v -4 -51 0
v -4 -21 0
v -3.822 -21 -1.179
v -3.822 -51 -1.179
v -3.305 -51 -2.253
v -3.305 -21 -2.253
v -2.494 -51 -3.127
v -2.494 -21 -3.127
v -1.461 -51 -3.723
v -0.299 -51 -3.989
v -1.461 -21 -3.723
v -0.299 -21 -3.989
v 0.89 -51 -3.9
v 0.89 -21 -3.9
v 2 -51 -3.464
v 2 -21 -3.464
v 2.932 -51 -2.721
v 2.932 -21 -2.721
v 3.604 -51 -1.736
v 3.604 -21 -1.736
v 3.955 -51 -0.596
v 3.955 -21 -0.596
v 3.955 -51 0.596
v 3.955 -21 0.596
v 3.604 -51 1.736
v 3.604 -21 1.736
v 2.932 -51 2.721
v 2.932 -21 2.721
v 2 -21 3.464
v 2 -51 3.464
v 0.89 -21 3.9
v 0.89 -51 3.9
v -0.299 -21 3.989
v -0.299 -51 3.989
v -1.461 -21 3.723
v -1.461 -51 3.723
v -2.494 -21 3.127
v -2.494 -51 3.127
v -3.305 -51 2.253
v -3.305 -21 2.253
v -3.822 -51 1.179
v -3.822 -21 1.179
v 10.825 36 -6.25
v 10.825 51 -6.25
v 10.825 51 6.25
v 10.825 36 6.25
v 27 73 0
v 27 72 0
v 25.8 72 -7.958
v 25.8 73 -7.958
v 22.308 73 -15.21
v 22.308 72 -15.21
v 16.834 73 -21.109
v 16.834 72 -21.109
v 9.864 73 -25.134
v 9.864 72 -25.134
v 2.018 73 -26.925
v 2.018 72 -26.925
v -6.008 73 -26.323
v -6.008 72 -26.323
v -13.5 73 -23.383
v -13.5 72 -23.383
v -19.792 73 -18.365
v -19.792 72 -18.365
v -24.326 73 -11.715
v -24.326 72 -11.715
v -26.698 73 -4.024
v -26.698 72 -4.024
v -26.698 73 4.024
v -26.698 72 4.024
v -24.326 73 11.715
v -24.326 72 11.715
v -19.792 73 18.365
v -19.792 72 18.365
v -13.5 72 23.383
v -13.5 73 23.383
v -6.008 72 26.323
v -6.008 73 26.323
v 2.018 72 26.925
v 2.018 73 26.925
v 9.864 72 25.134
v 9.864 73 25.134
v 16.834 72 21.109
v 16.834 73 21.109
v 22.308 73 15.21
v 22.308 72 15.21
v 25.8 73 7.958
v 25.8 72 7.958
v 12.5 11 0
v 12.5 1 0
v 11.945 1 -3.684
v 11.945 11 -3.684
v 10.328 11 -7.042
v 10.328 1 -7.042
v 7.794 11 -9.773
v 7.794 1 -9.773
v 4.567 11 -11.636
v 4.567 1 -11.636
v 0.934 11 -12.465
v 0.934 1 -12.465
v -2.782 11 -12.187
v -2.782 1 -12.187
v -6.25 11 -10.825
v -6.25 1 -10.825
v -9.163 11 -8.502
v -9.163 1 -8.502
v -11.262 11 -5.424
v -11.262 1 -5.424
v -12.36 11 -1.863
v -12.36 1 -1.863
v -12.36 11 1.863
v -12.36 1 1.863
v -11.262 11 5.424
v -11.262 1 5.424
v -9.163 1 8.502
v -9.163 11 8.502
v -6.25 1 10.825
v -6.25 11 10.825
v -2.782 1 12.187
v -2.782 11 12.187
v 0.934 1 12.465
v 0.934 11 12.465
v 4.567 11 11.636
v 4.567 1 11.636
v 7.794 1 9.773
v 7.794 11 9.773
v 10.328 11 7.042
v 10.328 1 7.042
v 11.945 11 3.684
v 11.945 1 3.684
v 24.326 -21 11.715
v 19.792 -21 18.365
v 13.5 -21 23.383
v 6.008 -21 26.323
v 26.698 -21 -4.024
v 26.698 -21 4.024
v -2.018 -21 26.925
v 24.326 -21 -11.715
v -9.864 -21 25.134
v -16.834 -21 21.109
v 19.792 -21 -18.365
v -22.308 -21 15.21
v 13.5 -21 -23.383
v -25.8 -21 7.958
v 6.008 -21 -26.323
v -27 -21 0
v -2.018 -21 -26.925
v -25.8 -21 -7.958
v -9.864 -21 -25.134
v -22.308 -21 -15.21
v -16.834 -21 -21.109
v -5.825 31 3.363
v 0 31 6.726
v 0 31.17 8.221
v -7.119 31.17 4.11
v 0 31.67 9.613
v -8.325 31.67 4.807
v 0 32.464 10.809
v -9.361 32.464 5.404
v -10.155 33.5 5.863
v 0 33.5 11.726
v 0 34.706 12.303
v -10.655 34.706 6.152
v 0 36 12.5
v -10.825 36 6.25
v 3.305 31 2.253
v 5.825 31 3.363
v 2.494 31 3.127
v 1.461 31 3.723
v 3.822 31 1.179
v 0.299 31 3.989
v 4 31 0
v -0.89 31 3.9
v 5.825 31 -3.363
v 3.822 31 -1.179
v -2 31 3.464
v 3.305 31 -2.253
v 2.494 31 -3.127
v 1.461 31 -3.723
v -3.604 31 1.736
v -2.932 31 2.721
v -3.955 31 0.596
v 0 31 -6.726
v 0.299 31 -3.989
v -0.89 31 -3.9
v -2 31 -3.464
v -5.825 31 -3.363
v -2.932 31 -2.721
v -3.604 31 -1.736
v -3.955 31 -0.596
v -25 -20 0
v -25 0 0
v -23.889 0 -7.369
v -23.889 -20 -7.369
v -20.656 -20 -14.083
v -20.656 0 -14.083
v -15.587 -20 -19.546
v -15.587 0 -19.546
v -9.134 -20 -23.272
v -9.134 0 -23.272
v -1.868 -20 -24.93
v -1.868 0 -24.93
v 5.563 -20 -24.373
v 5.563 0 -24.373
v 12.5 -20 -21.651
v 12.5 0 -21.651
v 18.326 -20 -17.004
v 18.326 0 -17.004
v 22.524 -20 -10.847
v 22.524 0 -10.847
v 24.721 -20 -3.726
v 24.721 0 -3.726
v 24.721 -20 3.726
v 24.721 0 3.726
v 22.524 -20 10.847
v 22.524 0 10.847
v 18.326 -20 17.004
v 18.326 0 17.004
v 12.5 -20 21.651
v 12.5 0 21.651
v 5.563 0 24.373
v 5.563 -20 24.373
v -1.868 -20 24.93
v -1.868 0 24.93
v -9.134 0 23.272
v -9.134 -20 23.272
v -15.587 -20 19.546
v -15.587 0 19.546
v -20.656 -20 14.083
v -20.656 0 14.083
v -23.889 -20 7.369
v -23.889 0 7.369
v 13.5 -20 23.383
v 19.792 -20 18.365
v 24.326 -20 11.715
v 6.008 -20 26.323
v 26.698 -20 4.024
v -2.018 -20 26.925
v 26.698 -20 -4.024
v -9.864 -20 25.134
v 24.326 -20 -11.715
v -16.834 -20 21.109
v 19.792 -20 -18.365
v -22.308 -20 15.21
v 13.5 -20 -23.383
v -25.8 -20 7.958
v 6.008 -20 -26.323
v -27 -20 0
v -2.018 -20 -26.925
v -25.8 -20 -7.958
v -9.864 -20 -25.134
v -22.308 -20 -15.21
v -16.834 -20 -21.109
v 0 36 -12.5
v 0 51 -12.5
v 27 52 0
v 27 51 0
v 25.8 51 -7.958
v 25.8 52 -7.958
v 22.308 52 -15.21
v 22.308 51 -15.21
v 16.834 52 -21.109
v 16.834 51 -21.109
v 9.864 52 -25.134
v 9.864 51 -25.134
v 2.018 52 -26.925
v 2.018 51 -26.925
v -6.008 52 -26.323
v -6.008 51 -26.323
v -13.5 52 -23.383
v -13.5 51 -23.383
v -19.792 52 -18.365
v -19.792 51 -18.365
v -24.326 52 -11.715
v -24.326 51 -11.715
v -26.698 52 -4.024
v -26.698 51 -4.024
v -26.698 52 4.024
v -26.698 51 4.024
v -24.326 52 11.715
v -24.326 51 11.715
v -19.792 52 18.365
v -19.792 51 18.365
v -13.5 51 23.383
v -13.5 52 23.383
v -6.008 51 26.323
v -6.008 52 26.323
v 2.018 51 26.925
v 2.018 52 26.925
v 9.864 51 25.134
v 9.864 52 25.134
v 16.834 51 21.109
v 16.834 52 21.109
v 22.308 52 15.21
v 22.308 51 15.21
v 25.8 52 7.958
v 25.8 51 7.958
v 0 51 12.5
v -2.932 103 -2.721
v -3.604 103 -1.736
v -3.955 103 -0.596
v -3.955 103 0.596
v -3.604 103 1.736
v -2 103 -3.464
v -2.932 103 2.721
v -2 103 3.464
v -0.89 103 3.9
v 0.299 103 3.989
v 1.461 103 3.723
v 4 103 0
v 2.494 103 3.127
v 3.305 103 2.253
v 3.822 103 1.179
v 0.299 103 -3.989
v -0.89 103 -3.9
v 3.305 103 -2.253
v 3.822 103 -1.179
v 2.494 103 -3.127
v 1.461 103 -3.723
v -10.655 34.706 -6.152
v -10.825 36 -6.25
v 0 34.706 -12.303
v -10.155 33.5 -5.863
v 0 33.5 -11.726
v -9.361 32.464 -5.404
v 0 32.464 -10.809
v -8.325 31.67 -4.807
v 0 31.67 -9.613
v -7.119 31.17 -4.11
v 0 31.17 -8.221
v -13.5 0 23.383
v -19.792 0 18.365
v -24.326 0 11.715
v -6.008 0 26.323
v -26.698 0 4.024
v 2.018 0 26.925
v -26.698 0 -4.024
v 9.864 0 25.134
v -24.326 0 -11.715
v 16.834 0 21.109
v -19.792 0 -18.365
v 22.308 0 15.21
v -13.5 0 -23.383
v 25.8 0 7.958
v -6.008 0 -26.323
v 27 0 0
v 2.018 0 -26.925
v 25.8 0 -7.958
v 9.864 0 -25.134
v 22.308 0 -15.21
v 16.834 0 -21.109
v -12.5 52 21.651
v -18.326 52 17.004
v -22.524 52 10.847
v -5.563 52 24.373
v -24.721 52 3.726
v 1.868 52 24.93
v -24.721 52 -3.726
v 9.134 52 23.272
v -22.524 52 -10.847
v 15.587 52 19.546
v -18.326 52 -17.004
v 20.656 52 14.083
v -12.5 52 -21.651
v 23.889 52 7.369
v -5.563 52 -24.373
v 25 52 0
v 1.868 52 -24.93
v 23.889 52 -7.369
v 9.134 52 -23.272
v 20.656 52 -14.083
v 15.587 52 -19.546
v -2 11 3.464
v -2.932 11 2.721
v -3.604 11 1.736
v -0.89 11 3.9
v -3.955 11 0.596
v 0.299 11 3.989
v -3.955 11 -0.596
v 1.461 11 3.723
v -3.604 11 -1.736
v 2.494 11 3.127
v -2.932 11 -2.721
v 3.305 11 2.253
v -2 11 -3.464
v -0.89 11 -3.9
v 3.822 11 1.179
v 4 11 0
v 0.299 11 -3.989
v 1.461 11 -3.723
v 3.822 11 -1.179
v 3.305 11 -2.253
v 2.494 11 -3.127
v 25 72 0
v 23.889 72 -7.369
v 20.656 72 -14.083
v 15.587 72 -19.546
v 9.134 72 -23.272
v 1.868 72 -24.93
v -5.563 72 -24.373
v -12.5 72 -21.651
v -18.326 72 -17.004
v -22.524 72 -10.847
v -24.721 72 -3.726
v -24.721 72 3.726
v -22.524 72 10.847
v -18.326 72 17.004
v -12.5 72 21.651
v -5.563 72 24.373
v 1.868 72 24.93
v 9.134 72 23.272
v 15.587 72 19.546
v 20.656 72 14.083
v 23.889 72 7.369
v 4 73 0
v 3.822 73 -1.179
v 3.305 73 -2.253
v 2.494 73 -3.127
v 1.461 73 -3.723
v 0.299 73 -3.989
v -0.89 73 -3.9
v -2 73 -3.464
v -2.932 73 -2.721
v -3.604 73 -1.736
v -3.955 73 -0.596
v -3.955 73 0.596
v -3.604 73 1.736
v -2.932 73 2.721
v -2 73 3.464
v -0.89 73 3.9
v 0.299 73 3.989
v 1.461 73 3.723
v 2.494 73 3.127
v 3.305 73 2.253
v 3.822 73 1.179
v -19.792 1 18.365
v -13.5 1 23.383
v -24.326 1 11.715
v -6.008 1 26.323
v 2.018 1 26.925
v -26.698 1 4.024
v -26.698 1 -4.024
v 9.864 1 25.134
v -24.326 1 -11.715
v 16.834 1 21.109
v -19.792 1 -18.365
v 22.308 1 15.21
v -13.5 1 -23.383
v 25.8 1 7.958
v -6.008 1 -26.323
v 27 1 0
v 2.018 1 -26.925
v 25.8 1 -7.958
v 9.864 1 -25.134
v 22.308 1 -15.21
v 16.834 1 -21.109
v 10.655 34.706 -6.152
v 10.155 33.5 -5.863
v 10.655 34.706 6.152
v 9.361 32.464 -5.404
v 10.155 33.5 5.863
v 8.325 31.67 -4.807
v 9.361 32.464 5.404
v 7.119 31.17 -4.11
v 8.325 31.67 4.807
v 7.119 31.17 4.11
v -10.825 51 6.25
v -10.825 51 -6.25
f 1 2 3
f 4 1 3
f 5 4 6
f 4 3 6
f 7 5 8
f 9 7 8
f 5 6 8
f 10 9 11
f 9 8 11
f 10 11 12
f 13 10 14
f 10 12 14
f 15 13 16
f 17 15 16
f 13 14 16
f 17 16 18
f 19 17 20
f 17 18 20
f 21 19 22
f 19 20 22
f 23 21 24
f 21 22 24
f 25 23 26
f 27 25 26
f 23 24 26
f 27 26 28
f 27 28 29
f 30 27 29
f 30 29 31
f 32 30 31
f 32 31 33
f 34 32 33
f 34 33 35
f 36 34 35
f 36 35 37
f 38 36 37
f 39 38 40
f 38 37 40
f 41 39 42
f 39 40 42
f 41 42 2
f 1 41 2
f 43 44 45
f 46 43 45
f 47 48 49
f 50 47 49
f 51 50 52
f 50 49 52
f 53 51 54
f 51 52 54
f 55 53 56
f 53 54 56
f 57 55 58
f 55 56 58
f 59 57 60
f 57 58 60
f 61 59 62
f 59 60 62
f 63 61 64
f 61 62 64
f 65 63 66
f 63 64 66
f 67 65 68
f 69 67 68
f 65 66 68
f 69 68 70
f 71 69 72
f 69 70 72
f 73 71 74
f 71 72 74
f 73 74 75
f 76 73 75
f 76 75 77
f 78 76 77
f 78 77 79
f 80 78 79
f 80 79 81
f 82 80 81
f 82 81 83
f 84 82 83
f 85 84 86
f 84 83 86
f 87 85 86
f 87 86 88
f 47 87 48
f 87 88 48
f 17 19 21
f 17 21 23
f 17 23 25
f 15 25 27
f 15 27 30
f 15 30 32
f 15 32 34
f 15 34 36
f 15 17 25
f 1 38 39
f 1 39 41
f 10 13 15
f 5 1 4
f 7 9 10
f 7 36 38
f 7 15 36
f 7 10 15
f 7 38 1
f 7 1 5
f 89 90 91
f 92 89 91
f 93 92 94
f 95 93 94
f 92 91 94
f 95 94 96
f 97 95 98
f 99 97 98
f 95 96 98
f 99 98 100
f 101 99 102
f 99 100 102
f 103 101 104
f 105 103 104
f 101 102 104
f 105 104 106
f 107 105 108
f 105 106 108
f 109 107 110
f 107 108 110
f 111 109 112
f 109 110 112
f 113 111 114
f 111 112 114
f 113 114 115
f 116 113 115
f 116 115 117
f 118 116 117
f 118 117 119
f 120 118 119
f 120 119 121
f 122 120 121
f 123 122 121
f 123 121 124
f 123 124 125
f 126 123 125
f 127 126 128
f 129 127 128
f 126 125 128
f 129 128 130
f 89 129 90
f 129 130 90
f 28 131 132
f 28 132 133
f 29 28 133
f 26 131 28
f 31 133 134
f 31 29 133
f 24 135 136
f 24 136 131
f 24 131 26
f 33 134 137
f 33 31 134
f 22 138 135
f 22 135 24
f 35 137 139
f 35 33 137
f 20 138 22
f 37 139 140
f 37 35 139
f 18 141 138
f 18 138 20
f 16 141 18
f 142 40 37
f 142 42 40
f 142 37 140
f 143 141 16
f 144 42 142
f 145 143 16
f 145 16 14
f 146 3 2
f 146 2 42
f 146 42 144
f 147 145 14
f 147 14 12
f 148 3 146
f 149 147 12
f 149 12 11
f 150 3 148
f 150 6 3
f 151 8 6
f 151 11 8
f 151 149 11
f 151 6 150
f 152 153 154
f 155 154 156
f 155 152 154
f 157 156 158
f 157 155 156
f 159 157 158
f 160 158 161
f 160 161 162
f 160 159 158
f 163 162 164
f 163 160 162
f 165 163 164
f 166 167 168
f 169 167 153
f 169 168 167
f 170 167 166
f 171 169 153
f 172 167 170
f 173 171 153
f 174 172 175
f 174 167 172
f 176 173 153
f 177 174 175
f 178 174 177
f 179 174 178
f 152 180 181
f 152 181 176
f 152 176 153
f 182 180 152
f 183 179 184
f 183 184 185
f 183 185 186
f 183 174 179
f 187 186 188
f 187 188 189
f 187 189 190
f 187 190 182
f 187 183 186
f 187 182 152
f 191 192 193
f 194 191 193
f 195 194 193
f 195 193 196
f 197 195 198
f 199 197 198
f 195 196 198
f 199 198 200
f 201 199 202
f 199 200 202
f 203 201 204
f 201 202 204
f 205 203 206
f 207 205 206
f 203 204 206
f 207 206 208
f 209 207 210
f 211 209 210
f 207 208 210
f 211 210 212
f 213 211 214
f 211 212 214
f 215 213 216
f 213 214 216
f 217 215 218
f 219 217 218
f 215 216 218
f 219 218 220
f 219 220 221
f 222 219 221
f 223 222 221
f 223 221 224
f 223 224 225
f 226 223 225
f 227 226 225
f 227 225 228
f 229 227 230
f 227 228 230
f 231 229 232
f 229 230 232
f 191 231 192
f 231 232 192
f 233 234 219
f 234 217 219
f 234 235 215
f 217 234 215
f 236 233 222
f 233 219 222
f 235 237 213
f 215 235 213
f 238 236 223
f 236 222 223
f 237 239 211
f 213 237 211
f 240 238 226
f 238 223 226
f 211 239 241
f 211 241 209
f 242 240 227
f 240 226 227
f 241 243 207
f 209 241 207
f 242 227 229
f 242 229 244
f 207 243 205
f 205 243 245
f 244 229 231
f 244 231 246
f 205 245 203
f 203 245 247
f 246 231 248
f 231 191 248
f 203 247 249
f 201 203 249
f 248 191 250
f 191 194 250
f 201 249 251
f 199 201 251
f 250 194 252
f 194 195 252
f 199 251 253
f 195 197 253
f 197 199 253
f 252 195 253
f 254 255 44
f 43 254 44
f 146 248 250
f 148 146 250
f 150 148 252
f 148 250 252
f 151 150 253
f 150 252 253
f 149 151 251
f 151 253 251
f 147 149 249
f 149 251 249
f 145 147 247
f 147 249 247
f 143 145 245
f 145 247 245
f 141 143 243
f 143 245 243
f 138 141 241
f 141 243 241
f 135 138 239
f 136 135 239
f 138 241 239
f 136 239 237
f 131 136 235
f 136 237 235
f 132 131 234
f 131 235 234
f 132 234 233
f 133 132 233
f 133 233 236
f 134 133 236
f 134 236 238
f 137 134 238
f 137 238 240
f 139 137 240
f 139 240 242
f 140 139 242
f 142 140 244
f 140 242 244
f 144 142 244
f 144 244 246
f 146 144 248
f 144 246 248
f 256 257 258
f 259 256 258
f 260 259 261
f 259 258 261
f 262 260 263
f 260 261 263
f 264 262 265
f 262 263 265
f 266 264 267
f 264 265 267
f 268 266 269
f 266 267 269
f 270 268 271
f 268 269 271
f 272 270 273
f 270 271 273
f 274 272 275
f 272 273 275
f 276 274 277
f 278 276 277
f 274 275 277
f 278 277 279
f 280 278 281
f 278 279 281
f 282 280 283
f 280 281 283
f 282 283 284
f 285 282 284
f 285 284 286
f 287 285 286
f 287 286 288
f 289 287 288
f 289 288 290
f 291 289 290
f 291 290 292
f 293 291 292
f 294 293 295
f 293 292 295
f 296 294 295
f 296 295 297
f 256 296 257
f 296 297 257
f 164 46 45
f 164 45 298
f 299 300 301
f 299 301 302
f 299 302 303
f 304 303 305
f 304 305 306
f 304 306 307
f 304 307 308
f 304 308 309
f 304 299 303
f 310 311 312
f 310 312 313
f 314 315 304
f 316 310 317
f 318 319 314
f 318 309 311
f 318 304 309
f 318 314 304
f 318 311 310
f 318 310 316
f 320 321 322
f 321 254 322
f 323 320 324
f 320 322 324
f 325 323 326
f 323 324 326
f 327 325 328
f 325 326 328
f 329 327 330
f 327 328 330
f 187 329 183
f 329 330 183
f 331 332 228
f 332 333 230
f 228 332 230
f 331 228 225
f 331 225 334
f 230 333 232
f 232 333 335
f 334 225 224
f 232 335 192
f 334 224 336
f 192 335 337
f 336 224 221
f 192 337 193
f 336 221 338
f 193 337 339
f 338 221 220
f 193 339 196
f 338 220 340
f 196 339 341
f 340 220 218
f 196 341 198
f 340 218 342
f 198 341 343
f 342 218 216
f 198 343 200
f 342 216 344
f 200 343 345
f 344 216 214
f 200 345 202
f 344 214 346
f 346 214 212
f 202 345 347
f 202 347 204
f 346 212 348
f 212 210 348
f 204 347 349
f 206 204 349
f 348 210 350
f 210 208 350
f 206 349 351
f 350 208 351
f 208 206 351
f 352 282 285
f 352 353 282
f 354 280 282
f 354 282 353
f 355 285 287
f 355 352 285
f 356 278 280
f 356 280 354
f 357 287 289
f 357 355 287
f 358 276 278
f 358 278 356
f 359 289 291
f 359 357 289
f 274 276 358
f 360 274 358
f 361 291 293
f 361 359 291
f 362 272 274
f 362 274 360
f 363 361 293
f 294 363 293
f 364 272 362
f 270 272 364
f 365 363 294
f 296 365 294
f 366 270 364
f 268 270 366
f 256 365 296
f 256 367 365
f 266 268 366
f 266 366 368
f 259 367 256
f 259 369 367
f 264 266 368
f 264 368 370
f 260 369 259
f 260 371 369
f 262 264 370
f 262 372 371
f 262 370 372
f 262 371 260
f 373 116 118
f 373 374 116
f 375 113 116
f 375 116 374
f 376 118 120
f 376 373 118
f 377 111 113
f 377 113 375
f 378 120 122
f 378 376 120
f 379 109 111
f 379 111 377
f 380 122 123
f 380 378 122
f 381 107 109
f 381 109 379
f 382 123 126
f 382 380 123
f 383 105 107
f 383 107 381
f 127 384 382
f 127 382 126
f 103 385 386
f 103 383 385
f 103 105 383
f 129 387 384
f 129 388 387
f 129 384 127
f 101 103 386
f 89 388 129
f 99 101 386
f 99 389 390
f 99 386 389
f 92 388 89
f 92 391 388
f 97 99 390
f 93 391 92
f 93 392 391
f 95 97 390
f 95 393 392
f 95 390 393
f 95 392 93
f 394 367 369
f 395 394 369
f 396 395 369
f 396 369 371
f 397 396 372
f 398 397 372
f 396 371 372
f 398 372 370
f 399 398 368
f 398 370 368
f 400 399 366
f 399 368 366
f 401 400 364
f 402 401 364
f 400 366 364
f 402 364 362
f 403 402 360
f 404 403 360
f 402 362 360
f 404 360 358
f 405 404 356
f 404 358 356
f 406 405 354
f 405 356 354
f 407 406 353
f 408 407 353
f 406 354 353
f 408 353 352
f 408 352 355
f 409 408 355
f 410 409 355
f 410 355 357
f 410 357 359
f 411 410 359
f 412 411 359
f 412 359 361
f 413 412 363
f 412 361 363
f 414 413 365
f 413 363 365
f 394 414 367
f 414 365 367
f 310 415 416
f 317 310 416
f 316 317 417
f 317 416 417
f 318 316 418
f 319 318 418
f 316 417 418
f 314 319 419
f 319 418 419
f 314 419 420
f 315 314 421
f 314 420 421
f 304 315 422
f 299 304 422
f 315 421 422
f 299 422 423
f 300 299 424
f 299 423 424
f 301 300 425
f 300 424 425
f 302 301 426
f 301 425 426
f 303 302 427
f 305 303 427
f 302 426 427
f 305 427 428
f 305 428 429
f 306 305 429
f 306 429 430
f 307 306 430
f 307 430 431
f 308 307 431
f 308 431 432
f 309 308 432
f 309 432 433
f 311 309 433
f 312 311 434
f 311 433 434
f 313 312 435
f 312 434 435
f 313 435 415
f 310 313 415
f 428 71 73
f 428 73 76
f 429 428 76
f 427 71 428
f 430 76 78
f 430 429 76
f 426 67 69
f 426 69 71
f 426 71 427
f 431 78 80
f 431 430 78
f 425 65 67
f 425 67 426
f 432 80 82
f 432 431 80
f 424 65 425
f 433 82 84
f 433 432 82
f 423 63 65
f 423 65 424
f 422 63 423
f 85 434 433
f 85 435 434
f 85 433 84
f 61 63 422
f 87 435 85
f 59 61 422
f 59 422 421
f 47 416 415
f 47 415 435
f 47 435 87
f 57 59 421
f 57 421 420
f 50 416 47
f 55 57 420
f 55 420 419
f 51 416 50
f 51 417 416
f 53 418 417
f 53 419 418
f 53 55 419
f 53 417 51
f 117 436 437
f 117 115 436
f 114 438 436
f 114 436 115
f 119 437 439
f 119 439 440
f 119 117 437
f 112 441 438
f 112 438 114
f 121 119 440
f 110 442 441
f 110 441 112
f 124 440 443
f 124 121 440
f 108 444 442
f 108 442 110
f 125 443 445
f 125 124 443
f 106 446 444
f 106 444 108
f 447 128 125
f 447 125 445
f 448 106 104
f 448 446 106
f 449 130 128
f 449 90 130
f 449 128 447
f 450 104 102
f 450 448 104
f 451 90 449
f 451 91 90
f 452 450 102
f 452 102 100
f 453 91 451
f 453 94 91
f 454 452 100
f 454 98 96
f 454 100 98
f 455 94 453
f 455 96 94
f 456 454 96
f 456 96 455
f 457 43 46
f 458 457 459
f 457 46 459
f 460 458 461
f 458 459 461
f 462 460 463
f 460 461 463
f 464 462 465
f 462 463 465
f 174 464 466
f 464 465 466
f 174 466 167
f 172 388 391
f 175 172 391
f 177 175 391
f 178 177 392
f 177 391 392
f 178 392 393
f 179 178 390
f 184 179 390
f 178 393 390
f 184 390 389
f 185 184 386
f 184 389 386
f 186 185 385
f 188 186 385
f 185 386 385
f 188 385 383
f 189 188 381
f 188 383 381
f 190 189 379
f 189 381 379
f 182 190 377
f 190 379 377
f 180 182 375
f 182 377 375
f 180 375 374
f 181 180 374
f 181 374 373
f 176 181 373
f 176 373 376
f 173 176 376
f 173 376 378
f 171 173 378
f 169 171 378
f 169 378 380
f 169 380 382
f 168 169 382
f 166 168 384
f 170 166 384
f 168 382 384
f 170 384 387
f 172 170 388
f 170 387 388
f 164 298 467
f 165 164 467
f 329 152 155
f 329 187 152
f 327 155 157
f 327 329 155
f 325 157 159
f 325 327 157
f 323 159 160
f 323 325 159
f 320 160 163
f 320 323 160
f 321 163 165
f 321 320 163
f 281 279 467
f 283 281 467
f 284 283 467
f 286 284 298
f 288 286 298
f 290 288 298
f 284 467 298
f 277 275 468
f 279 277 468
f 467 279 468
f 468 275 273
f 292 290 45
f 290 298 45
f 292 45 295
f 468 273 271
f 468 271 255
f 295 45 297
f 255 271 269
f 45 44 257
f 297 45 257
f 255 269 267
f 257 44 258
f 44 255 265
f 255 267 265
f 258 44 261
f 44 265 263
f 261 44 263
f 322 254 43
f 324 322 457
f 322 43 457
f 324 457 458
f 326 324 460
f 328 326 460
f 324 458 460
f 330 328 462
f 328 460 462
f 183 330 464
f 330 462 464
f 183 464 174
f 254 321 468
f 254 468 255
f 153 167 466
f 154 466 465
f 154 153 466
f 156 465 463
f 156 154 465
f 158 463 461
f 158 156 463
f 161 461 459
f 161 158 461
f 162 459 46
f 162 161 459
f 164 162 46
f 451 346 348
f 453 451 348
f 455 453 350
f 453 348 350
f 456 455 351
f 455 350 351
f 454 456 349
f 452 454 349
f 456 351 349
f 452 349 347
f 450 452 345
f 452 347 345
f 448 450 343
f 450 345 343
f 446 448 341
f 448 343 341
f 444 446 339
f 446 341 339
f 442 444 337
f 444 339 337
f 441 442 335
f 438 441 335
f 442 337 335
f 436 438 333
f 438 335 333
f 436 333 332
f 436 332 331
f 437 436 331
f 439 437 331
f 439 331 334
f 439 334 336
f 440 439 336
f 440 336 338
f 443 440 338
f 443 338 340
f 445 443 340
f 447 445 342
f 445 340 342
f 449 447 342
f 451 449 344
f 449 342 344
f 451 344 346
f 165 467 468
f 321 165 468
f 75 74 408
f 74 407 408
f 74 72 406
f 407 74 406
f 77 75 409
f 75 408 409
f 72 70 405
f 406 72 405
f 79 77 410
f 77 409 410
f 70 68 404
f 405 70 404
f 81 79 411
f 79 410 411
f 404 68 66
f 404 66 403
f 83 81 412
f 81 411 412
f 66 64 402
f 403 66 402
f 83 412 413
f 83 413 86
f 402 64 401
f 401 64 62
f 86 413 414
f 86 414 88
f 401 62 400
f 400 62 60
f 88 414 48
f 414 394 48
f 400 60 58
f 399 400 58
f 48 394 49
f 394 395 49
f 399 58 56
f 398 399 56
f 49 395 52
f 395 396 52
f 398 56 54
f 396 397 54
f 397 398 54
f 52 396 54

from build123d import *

# Parameters (mm, degrees)
SKETCH2_R            = 27
BOSS_EXTRUDE1_DEPTH  = 1
SKETCH3_R            = 12.5
BOSS_EXTRUDE2_DEPTH  = 10
SKETCH4_R            = 4
BOSS_EXTRUDE3_DEPTH  = 20
BOSS_EXTRUDE4_DEPTH  = 20
FILLET1_R            = 5
SKETCH6_R            = 27
BOSS_EXTRUDE5_DEPTH  = 1
SKETCH7_R            = 25
BOSS_EXTRUDE6_DEPTH  = 20
SKETCH8_R            = 27
BOSS_EXTRUDE7_DEPTH  = 1
SKETCH9_R            = 4
BOSS_EXTRUDE8_DEPTH  = 30
SKETCH10_R           = 25
BOSS_EXTRUDE9_DEPTH  = 20
SKETCH11_R           = 27
BOSS_EXTRUDE10_DEPTH = 1
SKETCH12_R           = 4
BOSS_EXTRUDE11_DEPTH = 30


with BuildPart() as part:
    # Sketch2 → Boss-Extrude1 (new body)
    with BuildSketch(Plane(origin=(0, 0, 0), x_dir=(1, 0, 0), z_dir=(0, 1, 0))):
        Circle(SKETCH2_R)
    extrude(amount=BOSS_EXTRUDE1_DEPTH)

    # Sketch3 → Boss-Extrude2 (add)
    with BuildSketch(Plane(origin=(0, 1, 0), x_dir=(1, 0, 0), z_dir=(0, 1, 0))):
        Circle(SKETCH3_R)
    extrude(amount=BOSS_EXTRUDE2_DEPTH)

    # Sketch4 → Boss-Extrude3 (add)
    with BuildSketch(Plane(origin=(0, 11, 0), x_dir=(1, 0, 0), z_dir=(0, 1, 0))):
        Circle(SKETCH4_R)
    extrude(amount=BOSS_EXTRUDE3_DEPTH)

    # Sketch5 → Boss-Extrude4 (add)
    with BuildSketch(Plane(origin=(0, 31, 0), x_dir=(1, 0, 0), z_dir=(0, 1, 0))):
        Polygon((0, 12.5), (10.825317547, 6.25), (10.825317547, -6.25), (0, -12.5), (-10.825317547, -6.25), (-10.825317547, 6.25), align=None)
    extrude(amount=BOSS_EXTRUDE4_DEPTH)

    # Fillet1
    fillet1_edges = [part.edges().sort_by_distance(p)[0] for p in [
        (-5.412658774, 31, -9.375),
        (-10.825317547, 31, 0),
        (-5.412658774, 31, 9.375),
        (5.412658774, 31, 9.375),
        (10.825317547, 31, 0),
        (5.412658774, 31, -9.375),
    ]]
    fillet(fillet1_edges, radius=FILLET1_R)

    # Sketch6 → Boss-Extrude5 (add)
    with BuildSketch(Plane(origin=(0, 51, 0), x_dir=(1, 0, 0), z_dir=(0, 1, 0))):
        Circle(SKETCH6_R)
    extrude(amount=BOSS_EXTRUDE5_DEPTH)

    # Sketch7 → Boss-Extrude6 (add)
    with BuildSketch(Plane(origin=(0, 52, 0), x_dir=(1, 0, 0), z_dir=(0, 1, 0))):
        Circle(SKETCH7_R)
    extrude(amount=BOSS_EXTRUDE6_DEPTH)

    # Sketch8 → Boss-Extrude7 (add)
    with BuildSketch(Plane(origin=(0, 72, 0), x_dir=(1, 0, 0), z_dir=(0, 1, 0))):
        Circle(SKETCH8_R)
    extrude(amount=BOSS_EXTRUDE7_DEPTH)

    # Sketch9 → Boss-Extrude8 (add)
    with BuildSketch(Plane(origin=(0, 73, 0), x_dir=(1, 0, 0), z_dir=(0, 1, 0))):
        Circle(SKETCH9_R)
    extrude(amount=BOSS_EXTRUDE8_DEPTH)

    # Sketch10 → Boss-Extrude9 (add)
    with BuildSketch(Plane(origin=(0, 0, 0), x_dir=(-1, 0, 0), z_dir=(0, -1, 0))):
        Circle(SKETCH10_R)
    extrude(amount=BOSS_EXTRUDE9_DEPTH)

    # Sketch11 → Boss-Extrude10 (add)
    with BuildSketch(Plane(origin=(0, -20, 0), x_dir=(-1, 0, 0), z_dir=(0, -1, 0))):
        Circle(SKETCH11_R)
    extrude(amount=BOSS_EXTRUDE10_DEPTH)

    # Sketch12 → Boss-Extrude11 (add)
    with BuildSketch(Plane(origin=(0, -21, 0), x_dir=(-1, 0, 0), z_dir=(0, -1, 0))):
        Circle(SKETCH12_R)
    extrude(amount=BOSS_EXTRUDE11_DEPTH)


solid = part.part
